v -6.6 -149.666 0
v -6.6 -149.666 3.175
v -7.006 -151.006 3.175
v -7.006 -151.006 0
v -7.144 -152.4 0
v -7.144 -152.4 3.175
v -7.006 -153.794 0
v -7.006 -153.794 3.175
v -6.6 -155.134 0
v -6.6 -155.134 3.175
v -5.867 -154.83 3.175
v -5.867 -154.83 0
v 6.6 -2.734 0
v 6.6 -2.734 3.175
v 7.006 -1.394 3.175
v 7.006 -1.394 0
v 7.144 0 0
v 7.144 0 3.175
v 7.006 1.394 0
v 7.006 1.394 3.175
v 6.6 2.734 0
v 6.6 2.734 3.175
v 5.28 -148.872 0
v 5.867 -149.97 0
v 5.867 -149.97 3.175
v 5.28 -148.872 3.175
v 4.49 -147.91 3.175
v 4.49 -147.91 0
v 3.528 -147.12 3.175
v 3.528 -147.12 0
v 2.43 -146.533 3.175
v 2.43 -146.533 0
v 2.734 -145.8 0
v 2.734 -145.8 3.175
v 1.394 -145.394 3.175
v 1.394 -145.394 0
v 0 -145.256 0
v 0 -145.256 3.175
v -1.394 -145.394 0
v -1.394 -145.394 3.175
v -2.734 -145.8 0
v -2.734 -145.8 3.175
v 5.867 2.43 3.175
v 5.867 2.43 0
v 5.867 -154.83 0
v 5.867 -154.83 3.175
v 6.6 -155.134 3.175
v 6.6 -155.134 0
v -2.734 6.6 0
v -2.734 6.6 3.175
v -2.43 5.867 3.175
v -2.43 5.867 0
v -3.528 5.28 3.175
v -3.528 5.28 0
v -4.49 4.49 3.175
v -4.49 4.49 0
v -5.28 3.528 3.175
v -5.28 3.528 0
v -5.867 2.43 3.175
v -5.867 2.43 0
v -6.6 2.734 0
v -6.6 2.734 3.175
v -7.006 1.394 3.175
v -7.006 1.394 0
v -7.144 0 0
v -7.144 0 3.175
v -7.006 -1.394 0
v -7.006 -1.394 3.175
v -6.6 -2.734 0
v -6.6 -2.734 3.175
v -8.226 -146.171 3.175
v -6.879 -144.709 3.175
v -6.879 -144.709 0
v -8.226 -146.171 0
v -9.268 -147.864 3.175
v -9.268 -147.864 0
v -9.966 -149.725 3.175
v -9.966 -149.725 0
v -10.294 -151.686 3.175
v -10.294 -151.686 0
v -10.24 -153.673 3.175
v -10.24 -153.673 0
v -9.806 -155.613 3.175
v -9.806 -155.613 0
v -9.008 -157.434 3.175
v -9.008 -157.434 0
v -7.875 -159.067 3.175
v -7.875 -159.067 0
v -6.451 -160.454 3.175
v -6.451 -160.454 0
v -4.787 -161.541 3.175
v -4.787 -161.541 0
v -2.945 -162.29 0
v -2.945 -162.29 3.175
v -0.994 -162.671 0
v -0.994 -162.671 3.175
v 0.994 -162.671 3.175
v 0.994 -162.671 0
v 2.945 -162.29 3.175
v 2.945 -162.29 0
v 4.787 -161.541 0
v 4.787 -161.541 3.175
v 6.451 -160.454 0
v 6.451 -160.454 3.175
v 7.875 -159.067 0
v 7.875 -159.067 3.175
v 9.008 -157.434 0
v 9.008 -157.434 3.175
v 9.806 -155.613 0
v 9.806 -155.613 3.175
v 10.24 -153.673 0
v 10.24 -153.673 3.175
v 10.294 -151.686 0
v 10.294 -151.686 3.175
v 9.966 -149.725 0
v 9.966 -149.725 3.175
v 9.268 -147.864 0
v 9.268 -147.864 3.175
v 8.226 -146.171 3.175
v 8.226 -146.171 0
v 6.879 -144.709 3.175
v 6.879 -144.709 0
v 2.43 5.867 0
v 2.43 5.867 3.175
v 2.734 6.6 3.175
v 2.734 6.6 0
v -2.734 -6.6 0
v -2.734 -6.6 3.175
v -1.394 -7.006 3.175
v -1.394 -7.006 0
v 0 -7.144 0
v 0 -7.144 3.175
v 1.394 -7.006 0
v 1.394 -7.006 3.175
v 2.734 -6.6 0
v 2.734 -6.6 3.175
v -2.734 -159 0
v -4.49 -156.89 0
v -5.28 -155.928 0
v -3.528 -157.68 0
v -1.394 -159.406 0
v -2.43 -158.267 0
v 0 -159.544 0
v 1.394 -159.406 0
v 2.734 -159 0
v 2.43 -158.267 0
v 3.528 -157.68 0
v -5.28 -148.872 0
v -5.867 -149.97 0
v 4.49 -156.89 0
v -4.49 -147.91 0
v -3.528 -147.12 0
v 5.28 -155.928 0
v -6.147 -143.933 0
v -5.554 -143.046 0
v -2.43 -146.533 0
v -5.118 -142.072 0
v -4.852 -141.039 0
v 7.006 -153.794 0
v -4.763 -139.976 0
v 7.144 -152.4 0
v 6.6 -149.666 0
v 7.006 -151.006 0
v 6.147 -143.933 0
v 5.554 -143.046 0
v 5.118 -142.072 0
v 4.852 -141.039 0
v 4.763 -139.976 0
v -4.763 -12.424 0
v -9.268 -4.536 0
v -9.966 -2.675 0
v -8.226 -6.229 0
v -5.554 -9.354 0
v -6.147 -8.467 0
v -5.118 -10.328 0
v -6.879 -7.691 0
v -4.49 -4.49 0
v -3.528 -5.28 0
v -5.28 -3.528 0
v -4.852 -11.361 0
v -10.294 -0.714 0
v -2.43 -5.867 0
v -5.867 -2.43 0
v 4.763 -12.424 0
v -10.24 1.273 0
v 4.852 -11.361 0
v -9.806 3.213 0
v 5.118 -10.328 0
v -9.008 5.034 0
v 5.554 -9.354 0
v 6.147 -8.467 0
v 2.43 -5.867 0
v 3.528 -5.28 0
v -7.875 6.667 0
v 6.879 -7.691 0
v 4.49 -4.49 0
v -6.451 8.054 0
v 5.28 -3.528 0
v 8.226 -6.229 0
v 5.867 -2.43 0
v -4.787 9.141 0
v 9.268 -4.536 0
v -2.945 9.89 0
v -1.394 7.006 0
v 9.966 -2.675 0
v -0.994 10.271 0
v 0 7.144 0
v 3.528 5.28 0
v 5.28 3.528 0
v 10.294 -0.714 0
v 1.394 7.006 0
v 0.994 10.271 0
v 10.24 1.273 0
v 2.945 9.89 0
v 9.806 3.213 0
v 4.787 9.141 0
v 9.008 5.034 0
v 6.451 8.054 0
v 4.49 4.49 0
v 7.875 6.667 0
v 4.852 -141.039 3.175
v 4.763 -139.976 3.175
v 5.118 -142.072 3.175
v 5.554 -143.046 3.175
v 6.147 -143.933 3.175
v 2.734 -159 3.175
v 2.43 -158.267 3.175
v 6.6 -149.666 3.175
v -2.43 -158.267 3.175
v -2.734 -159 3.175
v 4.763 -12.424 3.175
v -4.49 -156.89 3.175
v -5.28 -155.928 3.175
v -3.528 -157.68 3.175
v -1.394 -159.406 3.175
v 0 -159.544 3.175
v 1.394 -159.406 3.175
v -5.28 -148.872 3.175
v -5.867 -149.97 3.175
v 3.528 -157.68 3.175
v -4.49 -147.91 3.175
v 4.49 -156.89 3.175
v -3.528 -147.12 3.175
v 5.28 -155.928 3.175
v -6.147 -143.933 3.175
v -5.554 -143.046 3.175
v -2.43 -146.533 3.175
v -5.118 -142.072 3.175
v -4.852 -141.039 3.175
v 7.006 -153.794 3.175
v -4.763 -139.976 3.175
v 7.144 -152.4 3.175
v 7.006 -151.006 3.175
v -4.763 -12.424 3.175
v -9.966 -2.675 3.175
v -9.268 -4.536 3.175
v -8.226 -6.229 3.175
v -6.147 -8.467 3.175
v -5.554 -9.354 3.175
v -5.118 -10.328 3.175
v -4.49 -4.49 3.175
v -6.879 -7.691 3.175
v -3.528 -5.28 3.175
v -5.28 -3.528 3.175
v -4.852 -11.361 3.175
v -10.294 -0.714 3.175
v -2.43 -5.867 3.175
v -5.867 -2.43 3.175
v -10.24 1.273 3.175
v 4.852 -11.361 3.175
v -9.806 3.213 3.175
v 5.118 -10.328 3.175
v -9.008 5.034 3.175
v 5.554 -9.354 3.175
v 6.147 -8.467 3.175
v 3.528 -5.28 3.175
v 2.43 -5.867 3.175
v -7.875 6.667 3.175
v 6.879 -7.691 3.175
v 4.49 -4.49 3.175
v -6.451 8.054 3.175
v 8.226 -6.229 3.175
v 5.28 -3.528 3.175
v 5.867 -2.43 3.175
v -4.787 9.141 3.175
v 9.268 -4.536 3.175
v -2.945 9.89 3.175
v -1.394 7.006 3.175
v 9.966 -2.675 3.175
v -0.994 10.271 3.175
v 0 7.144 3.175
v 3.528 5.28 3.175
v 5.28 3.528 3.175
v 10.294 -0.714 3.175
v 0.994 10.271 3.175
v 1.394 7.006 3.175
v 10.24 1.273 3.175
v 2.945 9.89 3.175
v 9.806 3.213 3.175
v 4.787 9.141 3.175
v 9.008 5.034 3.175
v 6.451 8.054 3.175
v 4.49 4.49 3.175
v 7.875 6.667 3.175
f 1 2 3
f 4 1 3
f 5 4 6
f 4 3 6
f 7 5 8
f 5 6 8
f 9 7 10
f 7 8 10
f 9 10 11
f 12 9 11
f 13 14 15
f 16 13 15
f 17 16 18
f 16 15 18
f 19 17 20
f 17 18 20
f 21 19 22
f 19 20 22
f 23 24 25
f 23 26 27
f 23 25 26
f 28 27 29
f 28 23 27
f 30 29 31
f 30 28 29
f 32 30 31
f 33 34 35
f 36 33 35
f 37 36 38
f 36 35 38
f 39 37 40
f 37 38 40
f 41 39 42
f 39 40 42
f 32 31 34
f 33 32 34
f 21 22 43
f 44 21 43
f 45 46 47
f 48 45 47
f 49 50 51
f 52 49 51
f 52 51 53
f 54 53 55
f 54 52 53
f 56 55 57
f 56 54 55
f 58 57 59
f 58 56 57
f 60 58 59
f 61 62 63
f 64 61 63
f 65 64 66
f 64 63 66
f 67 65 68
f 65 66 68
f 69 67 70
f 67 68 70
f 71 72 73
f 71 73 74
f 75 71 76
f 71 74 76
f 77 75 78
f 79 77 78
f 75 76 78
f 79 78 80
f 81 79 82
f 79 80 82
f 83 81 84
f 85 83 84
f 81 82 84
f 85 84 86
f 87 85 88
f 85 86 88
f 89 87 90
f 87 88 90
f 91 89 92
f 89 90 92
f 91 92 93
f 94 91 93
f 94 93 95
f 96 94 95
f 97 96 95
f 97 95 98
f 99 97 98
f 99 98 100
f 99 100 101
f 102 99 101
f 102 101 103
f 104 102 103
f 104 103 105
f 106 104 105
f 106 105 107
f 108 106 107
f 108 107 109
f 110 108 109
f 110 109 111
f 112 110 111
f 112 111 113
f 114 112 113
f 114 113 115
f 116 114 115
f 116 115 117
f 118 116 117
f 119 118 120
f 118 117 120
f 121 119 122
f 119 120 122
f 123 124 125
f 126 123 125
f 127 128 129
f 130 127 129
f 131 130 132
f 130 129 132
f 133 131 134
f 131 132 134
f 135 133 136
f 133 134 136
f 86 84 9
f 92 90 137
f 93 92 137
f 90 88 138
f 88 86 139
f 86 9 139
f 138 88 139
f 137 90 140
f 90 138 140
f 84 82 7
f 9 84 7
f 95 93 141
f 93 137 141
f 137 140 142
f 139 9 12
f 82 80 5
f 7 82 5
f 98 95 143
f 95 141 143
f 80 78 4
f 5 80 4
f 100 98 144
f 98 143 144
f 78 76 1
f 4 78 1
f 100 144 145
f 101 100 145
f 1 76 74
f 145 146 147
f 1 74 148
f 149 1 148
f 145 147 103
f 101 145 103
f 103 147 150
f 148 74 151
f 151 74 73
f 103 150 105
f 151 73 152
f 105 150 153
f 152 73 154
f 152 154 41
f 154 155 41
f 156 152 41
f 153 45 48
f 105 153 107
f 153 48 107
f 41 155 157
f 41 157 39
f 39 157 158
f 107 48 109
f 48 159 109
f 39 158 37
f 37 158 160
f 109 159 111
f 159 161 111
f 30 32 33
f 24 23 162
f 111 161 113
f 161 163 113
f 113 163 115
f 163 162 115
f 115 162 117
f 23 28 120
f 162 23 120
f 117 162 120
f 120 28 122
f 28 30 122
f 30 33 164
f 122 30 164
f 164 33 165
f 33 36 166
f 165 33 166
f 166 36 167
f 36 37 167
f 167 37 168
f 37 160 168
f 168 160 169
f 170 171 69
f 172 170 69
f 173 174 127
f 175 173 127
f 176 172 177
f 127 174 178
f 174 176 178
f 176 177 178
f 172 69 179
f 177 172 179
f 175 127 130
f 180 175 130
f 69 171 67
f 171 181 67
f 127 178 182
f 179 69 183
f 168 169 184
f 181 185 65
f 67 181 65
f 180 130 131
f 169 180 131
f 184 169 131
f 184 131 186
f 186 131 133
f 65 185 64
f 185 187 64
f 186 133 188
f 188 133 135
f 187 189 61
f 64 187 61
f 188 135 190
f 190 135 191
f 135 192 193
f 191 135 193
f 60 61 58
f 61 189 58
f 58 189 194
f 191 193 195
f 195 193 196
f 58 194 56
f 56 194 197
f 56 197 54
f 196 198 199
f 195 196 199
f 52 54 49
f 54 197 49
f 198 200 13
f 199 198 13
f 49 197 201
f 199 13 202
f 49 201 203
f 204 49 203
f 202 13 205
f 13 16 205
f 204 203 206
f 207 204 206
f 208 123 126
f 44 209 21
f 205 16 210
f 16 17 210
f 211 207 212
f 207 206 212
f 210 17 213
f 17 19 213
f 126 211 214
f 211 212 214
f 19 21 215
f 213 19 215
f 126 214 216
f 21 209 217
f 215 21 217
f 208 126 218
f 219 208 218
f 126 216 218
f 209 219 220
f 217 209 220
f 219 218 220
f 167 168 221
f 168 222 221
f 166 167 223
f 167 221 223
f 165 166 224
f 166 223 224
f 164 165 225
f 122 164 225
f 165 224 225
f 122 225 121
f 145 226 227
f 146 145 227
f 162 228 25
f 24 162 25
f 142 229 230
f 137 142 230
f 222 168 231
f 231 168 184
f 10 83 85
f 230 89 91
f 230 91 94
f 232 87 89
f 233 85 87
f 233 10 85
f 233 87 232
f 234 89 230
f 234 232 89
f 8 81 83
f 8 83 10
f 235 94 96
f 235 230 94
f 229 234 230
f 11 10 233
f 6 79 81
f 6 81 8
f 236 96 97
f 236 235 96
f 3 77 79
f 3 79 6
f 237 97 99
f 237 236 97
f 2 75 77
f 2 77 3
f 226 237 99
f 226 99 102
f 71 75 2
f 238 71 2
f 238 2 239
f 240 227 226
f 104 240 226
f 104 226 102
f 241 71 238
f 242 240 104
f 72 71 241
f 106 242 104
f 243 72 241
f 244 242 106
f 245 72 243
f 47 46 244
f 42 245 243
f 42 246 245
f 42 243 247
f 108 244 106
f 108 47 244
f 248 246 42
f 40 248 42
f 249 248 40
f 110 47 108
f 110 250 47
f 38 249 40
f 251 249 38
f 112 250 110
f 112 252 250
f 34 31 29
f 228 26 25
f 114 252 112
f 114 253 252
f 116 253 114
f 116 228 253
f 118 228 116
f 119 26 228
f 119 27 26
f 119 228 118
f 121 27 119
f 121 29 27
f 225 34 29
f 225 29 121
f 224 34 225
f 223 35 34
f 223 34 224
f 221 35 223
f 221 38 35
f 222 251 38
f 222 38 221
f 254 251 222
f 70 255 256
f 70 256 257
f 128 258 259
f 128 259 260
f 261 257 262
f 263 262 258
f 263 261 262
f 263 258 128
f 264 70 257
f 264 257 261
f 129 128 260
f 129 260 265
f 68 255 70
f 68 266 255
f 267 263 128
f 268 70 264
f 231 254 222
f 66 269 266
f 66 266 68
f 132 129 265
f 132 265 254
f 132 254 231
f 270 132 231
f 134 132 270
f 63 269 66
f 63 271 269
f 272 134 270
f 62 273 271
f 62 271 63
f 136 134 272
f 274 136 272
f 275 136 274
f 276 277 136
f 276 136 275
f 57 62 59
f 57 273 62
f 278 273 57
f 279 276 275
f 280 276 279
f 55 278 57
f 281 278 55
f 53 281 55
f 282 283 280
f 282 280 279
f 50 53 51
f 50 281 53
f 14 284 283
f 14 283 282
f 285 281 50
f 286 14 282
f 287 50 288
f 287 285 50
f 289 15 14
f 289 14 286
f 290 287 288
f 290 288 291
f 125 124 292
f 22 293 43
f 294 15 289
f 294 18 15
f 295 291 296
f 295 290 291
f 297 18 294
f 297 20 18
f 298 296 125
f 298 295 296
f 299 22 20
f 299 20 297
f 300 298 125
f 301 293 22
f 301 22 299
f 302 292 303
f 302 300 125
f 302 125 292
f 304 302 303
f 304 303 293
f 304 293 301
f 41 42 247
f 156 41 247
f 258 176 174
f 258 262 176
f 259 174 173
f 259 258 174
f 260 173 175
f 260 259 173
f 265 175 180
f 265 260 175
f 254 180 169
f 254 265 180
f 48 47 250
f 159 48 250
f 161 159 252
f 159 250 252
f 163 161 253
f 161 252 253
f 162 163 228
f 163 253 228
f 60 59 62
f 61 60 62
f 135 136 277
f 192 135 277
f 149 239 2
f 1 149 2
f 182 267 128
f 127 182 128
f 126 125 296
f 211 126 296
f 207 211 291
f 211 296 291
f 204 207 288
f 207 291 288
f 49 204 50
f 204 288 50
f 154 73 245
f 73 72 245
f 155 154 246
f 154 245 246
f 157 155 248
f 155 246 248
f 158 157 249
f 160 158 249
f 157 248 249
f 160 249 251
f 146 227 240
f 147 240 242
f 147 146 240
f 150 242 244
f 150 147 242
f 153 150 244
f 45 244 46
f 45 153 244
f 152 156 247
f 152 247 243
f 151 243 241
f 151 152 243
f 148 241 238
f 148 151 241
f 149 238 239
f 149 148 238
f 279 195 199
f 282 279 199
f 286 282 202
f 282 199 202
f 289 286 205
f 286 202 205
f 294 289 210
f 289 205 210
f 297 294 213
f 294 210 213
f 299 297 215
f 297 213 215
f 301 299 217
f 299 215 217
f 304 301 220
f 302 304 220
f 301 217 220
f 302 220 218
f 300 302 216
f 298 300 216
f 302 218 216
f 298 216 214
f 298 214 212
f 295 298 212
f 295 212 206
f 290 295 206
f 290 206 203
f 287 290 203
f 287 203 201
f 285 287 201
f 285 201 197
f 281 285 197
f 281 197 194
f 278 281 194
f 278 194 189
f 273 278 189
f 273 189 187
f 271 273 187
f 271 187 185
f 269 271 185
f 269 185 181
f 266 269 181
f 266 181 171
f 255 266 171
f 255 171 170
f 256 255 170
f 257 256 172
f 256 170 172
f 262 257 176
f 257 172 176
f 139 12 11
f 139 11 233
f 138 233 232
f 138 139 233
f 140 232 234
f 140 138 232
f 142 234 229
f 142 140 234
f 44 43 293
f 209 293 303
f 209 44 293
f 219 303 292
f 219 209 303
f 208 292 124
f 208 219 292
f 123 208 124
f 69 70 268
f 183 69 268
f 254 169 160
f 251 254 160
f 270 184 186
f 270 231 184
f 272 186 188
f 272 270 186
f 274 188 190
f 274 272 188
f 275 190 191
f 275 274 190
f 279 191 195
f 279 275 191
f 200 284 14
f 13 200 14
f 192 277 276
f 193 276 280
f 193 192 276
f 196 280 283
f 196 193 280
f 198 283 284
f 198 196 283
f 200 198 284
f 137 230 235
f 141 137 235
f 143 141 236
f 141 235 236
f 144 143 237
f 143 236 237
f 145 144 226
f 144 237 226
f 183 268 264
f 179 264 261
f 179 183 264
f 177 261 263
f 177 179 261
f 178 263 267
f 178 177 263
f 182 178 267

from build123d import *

# Parameters (mm, degrees)
F0_R     = 6.35
F1_DEPTH = 3.175
F2_R     = 6.35
F4_DEPTH = 3.175
F5_COUNT = 4
F6_COUNT = 4


with BuildPart() as f1:
    # F0 (on Top) → F1 (new body)
    with BuildSketch(Plane.XY):
        with BuildLine():
            Line((4.7625, -143.2460284405), (4.7625, -9.1539715595))
            ThreePointArc((4.7625, -9.1539715595), (0, 10.31875), (-4.7625, -9.1539715595))
            Line((-4.7625, -9.1539715595), (-4.7625, -143.2460284405))
            ThreePointArc((-4.7625, -143.2460284405), (0, -162.71875), (4.7625, -143.2460284405))
        make_face()
        with Locations((0, -152.4)):
            Circle(F0_R, mode=Mode.SUBTRACT)
        Circle(F0_R, mode=Mode.SUBTRACT)
    extrude(amount=F1_DEPTH)

    # F2
    f2_edges = [f1.edges().sort_by_distance(p)[0] for p in [
        (4.7625, -9.153972, 1.5875),
        (-4.7625, -9.153972, 1.5875),
        (-4.7625, -143.246028, 1.5875),
        (4.7625, -143.246028, 1.5875),
    ]]
    fillet(f2_edges, radius=F2_R)

    # F3 (on face) → F4 (cut, through all)
    with BuildSketch(Plane.XY.offset(3.175)):
        with BuildLine():
            ThreePointArc((-5.8666350314, -154.8300397955), (-6.35, -152.4), (-5.8666350314, -149.9699602045))
            Line((-5.8666350314, -149.9699602045), (-6.5999644104, -149.66620523))
            ThreePointArc((-6.5999644104, -149.66620523), (-7.14375, -152.4), (-6.5999644104, -155.13379477))
            Line((-6.5999644104, -155.13379477), (-5.8666350314, -154.8300397955))
        make_face()
        with BuildLine():
            ThreePointArc((-5.8666350314, -2.4300397955), (-6.35, 0), (-5.8666350314, 2.4300397955))
            Line((-5.8666350314, 2.4300397955), (-6.5999644104, 2.73379477))
            ThreePointArc((-6.5999644104, 2.73379477), (-7.14375, 0), (-6.5999644104, -2.73379477))
            Line((-6.5999644104, -2.73379477), (-5.8666350314, -2.4300397955))
        make_face()
    f4 = extrude(amount=-F4_DEPTH, mode=Mode.SUBTRACT)

    # F5: F4 ×4 about axis
    f5_axis = Axis((0, -152.4, 3.175), (0, 0, 1))
    for i in range(1, F5_COUNT):
        add(f4.solids().sort_by_distance((-6.2333, -154.981917, 1.5875))[0].rotate(f5_axis, i * 360 / F5_COUNT), mode=Mode.SUBTRACT)

    # F6: F4 ×4 about axis
    f6_axis = Axis((0, 0, 3.175), (0, 0, 1))
    for i in range(1, F6_COUNT):
        add(f4.solids().sort_by_distance((-6.2333, 2.581917, 1.5875))[0].rotate(f6_axis, i * 360 / F6_COUNT), mode=Mode.SUBTRACT)


solid = f1.part
